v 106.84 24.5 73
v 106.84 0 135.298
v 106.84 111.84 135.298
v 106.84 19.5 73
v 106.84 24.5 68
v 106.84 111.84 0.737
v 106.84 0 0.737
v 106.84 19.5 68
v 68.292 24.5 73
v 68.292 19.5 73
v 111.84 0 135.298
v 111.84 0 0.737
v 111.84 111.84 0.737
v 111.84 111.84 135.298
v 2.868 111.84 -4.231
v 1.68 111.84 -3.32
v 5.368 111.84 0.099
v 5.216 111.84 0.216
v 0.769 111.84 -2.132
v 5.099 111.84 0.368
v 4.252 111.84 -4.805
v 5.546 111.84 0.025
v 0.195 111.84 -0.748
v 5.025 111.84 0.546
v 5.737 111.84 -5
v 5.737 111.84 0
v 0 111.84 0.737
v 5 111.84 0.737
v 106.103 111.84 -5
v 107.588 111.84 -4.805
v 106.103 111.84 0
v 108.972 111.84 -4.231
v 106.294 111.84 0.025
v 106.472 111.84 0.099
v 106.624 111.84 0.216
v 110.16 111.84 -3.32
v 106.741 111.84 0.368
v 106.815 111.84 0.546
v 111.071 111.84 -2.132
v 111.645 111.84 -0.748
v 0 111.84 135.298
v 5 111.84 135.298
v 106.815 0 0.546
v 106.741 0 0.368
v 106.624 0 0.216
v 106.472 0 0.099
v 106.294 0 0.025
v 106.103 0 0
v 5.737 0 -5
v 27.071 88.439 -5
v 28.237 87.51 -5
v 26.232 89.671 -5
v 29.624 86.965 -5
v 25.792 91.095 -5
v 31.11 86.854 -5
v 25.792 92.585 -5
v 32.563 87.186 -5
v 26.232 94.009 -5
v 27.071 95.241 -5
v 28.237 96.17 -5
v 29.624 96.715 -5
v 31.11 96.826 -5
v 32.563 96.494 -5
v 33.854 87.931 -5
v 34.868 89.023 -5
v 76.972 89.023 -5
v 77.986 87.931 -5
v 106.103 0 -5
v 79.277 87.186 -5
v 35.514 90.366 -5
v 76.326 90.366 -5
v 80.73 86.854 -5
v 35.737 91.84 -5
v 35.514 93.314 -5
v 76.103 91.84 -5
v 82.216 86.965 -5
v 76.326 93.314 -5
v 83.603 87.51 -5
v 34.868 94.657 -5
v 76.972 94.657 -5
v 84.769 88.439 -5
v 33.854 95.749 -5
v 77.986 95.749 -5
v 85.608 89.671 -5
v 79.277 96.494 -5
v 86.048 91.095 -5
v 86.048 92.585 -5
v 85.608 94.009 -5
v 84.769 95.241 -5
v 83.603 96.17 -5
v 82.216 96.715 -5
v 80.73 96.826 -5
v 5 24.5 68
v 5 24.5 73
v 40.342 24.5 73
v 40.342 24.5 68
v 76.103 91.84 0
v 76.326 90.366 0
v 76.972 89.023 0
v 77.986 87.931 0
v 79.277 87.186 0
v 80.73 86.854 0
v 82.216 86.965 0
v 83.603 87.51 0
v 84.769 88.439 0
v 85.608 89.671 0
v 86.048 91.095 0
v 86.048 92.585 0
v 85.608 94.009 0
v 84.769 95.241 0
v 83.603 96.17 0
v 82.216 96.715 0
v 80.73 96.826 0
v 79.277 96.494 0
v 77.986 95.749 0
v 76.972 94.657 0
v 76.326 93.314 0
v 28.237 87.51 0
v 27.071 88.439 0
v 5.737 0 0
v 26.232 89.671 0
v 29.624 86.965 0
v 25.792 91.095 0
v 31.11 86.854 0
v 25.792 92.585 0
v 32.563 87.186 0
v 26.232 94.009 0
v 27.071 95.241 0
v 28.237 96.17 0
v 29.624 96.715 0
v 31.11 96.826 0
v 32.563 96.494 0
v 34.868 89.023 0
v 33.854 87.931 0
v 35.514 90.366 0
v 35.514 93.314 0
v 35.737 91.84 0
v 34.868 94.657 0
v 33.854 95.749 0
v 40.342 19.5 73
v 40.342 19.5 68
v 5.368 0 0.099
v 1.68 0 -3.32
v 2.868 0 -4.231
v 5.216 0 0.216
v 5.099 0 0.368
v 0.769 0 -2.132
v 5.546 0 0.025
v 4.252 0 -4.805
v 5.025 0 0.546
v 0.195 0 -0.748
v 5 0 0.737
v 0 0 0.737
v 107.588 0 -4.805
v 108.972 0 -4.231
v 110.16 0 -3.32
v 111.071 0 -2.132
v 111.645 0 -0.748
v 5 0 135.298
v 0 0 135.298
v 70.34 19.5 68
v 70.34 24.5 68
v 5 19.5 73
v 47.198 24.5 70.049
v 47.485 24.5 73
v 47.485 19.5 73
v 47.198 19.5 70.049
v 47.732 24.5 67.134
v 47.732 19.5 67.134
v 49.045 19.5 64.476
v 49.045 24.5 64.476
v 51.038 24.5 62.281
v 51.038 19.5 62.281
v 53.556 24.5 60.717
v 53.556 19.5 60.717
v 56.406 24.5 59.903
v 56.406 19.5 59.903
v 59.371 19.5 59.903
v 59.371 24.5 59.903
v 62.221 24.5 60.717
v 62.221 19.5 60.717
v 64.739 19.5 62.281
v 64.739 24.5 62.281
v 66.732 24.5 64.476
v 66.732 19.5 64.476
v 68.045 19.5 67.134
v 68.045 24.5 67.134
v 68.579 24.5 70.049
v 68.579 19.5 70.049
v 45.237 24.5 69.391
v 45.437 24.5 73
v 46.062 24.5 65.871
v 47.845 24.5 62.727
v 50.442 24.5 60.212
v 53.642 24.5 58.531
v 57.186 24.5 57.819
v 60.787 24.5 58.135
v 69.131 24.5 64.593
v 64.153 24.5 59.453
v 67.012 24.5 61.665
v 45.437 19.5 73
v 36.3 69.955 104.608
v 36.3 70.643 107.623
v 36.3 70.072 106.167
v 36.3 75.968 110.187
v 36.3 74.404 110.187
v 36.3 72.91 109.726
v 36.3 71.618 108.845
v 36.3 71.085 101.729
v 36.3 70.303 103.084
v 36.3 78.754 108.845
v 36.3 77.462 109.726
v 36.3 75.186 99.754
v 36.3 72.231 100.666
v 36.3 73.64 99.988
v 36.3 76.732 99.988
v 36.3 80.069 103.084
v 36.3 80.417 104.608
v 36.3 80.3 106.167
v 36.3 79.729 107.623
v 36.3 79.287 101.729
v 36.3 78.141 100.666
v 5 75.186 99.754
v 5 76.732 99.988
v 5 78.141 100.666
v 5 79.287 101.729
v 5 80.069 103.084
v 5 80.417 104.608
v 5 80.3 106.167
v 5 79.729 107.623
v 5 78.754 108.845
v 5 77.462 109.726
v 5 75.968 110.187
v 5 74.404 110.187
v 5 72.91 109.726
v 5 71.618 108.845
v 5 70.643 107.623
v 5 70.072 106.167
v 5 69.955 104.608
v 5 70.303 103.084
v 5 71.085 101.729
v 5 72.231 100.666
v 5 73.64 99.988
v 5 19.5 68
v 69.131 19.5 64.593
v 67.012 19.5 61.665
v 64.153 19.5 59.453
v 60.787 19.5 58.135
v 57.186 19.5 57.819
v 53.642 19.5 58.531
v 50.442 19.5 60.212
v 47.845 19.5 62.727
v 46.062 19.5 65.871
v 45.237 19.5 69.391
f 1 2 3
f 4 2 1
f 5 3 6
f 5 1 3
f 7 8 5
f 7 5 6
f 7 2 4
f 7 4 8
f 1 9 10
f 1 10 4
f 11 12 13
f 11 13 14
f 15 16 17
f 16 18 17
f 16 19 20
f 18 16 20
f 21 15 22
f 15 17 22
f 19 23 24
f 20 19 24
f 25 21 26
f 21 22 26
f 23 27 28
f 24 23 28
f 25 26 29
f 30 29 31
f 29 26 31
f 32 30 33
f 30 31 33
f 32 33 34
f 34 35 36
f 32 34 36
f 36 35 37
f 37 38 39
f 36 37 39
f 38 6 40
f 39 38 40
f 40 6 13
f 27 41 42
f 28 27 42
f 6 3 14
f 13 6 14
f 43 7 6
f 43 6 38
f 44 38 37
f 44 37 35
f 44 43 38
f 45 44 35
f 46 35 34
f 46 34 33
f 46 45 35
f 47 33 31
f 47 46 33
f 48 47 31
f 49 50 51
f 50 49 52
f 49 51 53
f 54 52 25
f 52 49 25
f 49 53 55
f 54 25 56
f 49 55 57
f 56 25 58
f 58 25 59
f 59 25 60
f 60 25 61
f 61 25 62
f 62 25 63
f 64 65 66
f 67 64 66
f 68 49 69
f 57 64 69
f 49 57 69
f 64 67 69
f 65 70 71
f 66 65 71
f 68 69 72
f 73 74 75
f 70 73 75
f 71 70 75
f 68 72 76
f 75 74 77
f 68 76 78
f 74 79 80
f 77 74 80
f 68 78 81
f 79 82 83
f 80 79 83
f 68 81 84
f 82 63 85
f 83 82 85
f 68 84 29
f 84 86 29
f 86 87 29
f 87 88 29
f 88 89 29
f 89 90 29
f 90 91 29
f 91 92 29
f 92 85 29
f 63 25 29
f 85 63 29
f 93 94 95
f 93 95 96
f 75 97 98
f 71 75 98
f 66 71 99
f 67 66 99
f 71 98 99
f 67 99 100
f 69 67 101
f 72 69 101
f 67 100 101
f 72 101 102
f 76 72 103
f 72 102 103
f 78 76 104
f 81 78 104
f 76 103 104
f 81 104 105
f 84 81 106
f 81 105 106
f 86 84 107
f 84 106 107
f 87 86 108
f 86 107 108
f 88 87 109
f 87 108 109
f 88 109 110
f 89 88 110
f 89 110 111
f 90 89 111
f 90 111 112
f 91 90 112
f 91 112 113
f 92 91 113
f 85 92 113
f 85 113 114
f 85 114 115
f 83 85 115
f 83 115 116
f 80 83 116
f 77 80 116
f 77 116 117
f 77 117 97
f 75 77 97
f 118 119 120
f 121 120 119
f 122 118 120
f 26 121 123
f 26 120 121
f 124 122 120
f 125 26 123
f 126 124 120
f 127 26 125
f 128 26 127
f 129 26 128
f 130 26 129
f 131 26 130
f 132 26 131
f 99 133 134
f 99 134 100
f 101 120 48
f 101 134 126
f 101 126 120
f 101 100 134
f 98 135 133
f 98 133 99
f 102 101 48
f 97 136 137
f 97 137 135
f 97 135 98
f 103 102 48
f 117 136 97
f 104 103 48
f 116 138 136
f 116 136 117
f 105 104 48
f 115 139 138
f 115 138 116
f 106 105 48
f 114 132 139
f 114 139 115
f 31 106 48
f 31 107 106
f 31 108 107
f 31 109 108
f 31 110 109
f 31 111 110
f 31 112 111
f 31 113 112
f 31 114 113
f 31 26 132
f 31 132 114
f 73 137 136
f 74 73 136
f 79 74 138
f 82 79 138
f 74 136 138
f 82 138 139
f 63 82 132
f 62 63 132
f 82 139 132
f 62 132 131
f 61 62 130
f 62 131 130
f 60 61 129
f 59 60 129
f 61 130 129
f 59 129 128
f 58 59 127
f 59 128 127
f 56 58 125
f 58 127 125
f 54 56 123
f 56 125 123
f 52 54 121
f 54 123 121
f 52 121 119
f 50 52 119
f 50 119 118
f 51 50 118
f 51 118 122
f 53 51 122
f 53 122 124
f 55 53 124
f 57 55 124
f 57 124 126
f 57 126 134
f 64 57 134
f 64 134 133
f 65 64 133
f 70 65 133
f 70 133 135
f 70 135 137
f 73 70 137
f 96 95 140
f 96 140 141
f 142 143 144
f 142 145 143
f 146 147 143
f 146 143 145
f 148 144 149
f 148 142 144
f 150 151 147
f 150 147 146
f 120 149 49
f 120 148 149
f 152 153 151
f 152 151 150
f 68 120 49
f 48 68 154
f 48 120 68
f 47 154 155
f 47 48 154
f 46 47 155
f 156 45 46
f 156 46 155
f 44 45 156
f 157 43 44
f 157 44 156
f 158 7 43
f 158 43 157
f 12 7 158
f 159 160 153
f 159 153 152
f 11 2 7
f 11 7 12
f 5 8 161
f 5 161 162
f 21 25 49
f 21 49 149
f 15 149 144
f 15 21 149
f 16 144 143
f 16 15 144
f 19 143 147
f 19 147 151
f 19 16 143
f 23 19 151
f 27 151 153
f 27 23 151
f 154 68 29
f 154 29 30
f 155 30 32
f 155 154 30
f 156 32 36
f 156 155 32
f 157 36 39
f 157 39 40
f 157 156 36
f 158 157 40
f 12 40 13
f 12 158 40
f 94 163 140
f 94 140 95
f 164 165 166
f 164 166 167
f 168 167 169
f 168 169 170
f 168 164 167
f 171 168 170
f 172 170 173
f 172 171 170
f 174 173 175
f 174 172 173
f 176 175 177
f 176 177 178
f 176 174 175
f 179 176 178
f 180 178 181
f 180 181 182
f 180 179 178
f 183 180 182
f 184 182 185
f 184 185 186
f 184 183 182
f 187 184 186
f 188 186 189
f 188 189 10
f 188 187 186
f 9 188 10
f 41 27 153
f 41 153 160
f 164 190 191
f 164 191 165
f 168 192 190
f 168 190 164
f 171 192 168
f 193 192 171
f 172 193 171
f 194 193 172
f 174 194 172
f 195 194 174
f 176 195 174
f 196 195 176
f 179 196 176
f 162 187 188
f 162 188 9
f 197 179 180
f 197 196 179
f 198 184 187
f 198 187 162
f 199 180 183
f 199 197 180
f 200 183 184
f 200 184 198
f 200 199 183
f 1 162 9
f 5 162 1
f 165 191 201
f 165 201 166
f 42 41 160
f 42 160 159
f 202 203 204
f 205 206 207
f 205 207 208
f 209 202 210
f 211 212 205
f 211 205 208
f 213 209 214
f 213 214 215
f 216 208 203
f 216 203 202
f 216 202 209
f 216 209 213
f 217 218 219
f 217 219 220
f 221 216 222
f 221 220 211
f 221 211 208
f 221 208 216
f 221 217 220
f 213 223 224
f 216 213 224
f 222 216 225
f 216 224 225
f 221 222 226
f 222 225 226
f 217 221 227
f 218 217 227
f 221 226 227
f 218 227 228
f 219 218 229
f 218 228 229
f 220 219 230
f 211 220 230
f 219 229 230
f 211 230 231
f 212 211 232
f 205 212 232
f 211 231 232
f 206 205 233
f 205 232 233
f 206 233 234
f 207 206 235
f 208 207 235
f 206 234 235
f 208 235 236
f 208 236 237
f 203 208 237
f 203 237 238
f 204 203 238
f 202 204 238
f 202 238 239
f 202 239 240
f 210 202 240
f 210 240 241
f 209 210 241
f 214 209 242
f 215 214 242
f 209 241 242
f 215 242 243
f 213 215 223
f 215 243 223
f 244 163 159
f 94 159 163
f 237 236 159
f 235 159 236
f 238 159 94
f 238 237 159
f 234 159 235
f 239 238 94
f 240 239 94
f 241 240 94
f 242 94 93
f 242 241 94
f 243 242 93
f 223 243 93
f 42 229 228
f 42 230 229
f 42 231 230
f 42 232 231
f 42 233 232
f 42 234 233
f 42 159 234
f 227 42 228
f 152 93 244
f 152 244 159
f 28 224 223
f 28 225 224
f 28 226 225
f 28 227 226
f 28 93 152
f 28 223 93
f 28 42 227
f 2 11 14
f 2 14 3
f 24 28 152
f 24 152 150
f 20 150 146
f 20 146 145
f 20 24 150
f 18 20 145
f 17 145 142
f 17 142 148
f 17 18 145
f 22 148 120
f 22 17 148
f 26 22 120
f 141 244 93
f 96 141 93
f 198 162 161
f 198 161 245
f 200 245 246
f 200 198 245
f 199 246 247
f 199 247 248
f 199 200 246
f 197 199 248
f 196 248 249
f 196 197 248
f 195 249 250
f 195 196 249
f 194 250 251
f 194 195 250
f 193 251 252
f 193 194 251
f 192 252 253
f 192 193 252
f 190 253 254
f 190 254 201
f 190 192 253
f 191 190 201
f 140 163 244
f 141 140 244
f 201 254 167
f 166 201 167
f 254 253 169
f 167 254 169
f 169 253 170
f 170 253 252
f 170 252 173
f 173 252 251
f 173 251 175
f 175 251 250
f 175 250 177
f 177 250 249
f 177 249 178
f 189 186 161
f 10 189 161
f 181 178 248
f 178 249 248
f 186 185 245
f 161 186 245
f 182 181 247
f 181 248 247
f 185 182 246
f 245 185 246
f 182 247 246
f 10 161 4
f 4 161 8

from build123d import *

# Parameters (mm, degrees)
SKETCH13_W                   = 111.84
SKETCH13_H                   = 111.84
BASE_FLANGE2_DEPTH           = 5
EDGE_FLANGE1_STRIP_W         = 21.4732
EDGE_FLANGE1_STRIP_H         = 5
EDGE_FLANGE1_STRIP_CUT_DEPTH = 111.84
EDGE_FLANGE1_DEPTH           = 111.84
EDGE_FLANGE2_STRIP_W         = 21.4732
EDGE_FLANGE2_STRIP_H         = 5
EDGE_FLANGE2_STRIP_CUT_DEPTH = 111.84
EDGE_FLANGE2_DEPTH           = 111.84
SKETCH25_R                   = 5
CUT_EXTRUDE1_DEPTH           = 209.139184211
SKETCH27_W                   = 5
SKETCH27_H                   = 5
BOSS_EXTRUDE3_DEPTH          = 35.342
SKETCH28_W                   = 5
SKETCH28_H                   = 5
BOSS_EXTRUDE1_DEPTH          = 36.5
BOSS_EXTRUDE2_DEPTH          = 5
SKETCH40_R                   = 5.2455
BOSS_EXTRUDE7_DEPTH          = 31.3


# Sheet-metal steps are written as plain solids
with BuildPart() as part:
    # Sketch13 → Base-Flange2 (new body)
    with BuildSketch(Plane.XY):
        with Locations((55.92, 55.92)):
            Rectangle(SKETCH13_W, SKETCH13_H)
    extrude(amount=-BASE_FLANGE2_DEPTH)

    # Edge-Flange1 strip (across the edge) → Edge-Flange1 strip cut (cut)
    with BuildSketch(Plane.XZ.offset(-111.84)):
        with Locations((-5, -2.5)):
            Rectangle(EDGE_FLANGE1_STRIP_W, EDGE_FLANGE1_STRIP_H)
    extrude(amount=EDGE_FLANGE1_STRIP_CUT_DEPTH, mode=Mode.SUBTRACT)

    # Edge-Flange1 section (across the edge) → Edge-Flange1 (add)
    with BuildSketch(Plane.XZ.offset(-111.84)):
        with BuildLine():
            Line((0, 0.7366), (0, 135.298))
            Line((0, 135.298), (5, 135.298))
            Line((5, 135.298), (5, 0.7366))
            ThreePointArc((5, 0.7366), (5.215745145, 0.215745145), (5.7366, 0))
            Line((5.7366, 0), (5.7366, -5))
            ThreePointArc((5.7366, -5), (1.680211239, -3.319788761), (0, 0.7366))
        make_face()
    extrude(amount=EDGE_FLANGE1_DEPTH)

    # Edge-Flange2 strip (across the edge) → Edge-Flange2 strip cut (cut)
    with BuildSketch(Plane(origin=(111.84, 0, 0), x_dir=(-1, 0, 0), z_dir=(0, 1, 0))):
        with Locations((-5, -2.5)):
            Rectangle(EDGE_FLANGE2_STRIP_W, EDGE_FLANGE2_STRIP_H)
    extrude(amount=EDGE_FLANGE2_STRIP_CUT_DEPTH, mode=Mode.SUBTRACT)

    # Edge-Flange2 section (across the edge) → Edge-Flange2 (add)
    with BuildSketch(Plane(origin=(111.84, 0, 0), x_dir=(-1, 0, 0), z_dir=(0, 1, 0))):
        with BuildLine():
            Line((0, 0.7366), (0, 135.298))
            Line((0, 135.298), (5, 135.298))
            Line((5, 135.298), (5, 0.7366))
            ThreePointArc((5, 0.7366), (5.215745145, 0.215745145), (5.7366, 0))
            Line((5.7366, 0), (5.7366, -5))
            ThreePointArc((5.7366, -5), (1.680211239, -3.319788761), (0, 0.7366))
        make_face()
    extrude(amount=EDGE_FLANGE2_DEPTH)

    # Sketch25 → Cut-Extrude1 (cut, through all)
    with BuildSketch(Plane.XY):
        with Locations((30.7366, 91.84)):
            Circle(SKETCH25_R)
        with Locations(Location((81.1034, 91.84, 0), (0, 0, 180))):
            Circle(SKETCH25_R)
    extrude(amount=-CUT_EXTRUDE1_DEPTH, mode=Mode.SUBTRACT)

    # Sketch27 → Boss-Extrude3 (add)
    with BuildSketch(Plane(origin=(5, 0, 0), x_dir=(0, 0, -1), z_dir=(1, 0, 0))):
        with Locations((-70.5, 22)):
            Rectangle(SKETCH27_W, SKETCH27_H)
    extrude(amount=BOSS_EXTRUDE3_DEPTH)

    # Sketch28 → Boss-Extrude1 (add)
    with BuildSketch(Plane.ZY.offset(-106.84)):
        with Locations((70.5, 22)):
            Rectangle(SKETCH28_W, SKETCH28_H)
    extrude(amount=BOSS_EXTRUDE1_DEPTH)

    # Sketch29 → Boss-Extrude2 (add)
    with BuildSketch(Plane(origin=(0, 24.5, 0), x_dir=(1, 0, 0), z_dir=(0, 1, 0))):
        with BuildLine():
            Line((45.436988134, -73), (47.484648624, -73))
            ThreePointArc((47.484648624, -73), (57.888494067, -59.8), (68.29233951, -73))
            Line((68.29233951, -73), (70.34, -73))
            ThreePointArc((70.34, -73), (57.888494067, -57.8), (45.436988134, -73))
        make_face()
    extrude(amount=-BOSS_EXTRUDE2_DEPTH)

    # Sketch40 → Boss-Extrude7 (add)
    with BuildSketch(Plane(origin=(5, 0, 0), x_dir=(0, 0, -1), z_dir=(1, 0, 0))):
        with Locations((-105, 75.186)):
            Circle(SKETCH40_R)
    extrude(amount=BOSS_EXTRUDE7_DEPTH)


solid = part.part
